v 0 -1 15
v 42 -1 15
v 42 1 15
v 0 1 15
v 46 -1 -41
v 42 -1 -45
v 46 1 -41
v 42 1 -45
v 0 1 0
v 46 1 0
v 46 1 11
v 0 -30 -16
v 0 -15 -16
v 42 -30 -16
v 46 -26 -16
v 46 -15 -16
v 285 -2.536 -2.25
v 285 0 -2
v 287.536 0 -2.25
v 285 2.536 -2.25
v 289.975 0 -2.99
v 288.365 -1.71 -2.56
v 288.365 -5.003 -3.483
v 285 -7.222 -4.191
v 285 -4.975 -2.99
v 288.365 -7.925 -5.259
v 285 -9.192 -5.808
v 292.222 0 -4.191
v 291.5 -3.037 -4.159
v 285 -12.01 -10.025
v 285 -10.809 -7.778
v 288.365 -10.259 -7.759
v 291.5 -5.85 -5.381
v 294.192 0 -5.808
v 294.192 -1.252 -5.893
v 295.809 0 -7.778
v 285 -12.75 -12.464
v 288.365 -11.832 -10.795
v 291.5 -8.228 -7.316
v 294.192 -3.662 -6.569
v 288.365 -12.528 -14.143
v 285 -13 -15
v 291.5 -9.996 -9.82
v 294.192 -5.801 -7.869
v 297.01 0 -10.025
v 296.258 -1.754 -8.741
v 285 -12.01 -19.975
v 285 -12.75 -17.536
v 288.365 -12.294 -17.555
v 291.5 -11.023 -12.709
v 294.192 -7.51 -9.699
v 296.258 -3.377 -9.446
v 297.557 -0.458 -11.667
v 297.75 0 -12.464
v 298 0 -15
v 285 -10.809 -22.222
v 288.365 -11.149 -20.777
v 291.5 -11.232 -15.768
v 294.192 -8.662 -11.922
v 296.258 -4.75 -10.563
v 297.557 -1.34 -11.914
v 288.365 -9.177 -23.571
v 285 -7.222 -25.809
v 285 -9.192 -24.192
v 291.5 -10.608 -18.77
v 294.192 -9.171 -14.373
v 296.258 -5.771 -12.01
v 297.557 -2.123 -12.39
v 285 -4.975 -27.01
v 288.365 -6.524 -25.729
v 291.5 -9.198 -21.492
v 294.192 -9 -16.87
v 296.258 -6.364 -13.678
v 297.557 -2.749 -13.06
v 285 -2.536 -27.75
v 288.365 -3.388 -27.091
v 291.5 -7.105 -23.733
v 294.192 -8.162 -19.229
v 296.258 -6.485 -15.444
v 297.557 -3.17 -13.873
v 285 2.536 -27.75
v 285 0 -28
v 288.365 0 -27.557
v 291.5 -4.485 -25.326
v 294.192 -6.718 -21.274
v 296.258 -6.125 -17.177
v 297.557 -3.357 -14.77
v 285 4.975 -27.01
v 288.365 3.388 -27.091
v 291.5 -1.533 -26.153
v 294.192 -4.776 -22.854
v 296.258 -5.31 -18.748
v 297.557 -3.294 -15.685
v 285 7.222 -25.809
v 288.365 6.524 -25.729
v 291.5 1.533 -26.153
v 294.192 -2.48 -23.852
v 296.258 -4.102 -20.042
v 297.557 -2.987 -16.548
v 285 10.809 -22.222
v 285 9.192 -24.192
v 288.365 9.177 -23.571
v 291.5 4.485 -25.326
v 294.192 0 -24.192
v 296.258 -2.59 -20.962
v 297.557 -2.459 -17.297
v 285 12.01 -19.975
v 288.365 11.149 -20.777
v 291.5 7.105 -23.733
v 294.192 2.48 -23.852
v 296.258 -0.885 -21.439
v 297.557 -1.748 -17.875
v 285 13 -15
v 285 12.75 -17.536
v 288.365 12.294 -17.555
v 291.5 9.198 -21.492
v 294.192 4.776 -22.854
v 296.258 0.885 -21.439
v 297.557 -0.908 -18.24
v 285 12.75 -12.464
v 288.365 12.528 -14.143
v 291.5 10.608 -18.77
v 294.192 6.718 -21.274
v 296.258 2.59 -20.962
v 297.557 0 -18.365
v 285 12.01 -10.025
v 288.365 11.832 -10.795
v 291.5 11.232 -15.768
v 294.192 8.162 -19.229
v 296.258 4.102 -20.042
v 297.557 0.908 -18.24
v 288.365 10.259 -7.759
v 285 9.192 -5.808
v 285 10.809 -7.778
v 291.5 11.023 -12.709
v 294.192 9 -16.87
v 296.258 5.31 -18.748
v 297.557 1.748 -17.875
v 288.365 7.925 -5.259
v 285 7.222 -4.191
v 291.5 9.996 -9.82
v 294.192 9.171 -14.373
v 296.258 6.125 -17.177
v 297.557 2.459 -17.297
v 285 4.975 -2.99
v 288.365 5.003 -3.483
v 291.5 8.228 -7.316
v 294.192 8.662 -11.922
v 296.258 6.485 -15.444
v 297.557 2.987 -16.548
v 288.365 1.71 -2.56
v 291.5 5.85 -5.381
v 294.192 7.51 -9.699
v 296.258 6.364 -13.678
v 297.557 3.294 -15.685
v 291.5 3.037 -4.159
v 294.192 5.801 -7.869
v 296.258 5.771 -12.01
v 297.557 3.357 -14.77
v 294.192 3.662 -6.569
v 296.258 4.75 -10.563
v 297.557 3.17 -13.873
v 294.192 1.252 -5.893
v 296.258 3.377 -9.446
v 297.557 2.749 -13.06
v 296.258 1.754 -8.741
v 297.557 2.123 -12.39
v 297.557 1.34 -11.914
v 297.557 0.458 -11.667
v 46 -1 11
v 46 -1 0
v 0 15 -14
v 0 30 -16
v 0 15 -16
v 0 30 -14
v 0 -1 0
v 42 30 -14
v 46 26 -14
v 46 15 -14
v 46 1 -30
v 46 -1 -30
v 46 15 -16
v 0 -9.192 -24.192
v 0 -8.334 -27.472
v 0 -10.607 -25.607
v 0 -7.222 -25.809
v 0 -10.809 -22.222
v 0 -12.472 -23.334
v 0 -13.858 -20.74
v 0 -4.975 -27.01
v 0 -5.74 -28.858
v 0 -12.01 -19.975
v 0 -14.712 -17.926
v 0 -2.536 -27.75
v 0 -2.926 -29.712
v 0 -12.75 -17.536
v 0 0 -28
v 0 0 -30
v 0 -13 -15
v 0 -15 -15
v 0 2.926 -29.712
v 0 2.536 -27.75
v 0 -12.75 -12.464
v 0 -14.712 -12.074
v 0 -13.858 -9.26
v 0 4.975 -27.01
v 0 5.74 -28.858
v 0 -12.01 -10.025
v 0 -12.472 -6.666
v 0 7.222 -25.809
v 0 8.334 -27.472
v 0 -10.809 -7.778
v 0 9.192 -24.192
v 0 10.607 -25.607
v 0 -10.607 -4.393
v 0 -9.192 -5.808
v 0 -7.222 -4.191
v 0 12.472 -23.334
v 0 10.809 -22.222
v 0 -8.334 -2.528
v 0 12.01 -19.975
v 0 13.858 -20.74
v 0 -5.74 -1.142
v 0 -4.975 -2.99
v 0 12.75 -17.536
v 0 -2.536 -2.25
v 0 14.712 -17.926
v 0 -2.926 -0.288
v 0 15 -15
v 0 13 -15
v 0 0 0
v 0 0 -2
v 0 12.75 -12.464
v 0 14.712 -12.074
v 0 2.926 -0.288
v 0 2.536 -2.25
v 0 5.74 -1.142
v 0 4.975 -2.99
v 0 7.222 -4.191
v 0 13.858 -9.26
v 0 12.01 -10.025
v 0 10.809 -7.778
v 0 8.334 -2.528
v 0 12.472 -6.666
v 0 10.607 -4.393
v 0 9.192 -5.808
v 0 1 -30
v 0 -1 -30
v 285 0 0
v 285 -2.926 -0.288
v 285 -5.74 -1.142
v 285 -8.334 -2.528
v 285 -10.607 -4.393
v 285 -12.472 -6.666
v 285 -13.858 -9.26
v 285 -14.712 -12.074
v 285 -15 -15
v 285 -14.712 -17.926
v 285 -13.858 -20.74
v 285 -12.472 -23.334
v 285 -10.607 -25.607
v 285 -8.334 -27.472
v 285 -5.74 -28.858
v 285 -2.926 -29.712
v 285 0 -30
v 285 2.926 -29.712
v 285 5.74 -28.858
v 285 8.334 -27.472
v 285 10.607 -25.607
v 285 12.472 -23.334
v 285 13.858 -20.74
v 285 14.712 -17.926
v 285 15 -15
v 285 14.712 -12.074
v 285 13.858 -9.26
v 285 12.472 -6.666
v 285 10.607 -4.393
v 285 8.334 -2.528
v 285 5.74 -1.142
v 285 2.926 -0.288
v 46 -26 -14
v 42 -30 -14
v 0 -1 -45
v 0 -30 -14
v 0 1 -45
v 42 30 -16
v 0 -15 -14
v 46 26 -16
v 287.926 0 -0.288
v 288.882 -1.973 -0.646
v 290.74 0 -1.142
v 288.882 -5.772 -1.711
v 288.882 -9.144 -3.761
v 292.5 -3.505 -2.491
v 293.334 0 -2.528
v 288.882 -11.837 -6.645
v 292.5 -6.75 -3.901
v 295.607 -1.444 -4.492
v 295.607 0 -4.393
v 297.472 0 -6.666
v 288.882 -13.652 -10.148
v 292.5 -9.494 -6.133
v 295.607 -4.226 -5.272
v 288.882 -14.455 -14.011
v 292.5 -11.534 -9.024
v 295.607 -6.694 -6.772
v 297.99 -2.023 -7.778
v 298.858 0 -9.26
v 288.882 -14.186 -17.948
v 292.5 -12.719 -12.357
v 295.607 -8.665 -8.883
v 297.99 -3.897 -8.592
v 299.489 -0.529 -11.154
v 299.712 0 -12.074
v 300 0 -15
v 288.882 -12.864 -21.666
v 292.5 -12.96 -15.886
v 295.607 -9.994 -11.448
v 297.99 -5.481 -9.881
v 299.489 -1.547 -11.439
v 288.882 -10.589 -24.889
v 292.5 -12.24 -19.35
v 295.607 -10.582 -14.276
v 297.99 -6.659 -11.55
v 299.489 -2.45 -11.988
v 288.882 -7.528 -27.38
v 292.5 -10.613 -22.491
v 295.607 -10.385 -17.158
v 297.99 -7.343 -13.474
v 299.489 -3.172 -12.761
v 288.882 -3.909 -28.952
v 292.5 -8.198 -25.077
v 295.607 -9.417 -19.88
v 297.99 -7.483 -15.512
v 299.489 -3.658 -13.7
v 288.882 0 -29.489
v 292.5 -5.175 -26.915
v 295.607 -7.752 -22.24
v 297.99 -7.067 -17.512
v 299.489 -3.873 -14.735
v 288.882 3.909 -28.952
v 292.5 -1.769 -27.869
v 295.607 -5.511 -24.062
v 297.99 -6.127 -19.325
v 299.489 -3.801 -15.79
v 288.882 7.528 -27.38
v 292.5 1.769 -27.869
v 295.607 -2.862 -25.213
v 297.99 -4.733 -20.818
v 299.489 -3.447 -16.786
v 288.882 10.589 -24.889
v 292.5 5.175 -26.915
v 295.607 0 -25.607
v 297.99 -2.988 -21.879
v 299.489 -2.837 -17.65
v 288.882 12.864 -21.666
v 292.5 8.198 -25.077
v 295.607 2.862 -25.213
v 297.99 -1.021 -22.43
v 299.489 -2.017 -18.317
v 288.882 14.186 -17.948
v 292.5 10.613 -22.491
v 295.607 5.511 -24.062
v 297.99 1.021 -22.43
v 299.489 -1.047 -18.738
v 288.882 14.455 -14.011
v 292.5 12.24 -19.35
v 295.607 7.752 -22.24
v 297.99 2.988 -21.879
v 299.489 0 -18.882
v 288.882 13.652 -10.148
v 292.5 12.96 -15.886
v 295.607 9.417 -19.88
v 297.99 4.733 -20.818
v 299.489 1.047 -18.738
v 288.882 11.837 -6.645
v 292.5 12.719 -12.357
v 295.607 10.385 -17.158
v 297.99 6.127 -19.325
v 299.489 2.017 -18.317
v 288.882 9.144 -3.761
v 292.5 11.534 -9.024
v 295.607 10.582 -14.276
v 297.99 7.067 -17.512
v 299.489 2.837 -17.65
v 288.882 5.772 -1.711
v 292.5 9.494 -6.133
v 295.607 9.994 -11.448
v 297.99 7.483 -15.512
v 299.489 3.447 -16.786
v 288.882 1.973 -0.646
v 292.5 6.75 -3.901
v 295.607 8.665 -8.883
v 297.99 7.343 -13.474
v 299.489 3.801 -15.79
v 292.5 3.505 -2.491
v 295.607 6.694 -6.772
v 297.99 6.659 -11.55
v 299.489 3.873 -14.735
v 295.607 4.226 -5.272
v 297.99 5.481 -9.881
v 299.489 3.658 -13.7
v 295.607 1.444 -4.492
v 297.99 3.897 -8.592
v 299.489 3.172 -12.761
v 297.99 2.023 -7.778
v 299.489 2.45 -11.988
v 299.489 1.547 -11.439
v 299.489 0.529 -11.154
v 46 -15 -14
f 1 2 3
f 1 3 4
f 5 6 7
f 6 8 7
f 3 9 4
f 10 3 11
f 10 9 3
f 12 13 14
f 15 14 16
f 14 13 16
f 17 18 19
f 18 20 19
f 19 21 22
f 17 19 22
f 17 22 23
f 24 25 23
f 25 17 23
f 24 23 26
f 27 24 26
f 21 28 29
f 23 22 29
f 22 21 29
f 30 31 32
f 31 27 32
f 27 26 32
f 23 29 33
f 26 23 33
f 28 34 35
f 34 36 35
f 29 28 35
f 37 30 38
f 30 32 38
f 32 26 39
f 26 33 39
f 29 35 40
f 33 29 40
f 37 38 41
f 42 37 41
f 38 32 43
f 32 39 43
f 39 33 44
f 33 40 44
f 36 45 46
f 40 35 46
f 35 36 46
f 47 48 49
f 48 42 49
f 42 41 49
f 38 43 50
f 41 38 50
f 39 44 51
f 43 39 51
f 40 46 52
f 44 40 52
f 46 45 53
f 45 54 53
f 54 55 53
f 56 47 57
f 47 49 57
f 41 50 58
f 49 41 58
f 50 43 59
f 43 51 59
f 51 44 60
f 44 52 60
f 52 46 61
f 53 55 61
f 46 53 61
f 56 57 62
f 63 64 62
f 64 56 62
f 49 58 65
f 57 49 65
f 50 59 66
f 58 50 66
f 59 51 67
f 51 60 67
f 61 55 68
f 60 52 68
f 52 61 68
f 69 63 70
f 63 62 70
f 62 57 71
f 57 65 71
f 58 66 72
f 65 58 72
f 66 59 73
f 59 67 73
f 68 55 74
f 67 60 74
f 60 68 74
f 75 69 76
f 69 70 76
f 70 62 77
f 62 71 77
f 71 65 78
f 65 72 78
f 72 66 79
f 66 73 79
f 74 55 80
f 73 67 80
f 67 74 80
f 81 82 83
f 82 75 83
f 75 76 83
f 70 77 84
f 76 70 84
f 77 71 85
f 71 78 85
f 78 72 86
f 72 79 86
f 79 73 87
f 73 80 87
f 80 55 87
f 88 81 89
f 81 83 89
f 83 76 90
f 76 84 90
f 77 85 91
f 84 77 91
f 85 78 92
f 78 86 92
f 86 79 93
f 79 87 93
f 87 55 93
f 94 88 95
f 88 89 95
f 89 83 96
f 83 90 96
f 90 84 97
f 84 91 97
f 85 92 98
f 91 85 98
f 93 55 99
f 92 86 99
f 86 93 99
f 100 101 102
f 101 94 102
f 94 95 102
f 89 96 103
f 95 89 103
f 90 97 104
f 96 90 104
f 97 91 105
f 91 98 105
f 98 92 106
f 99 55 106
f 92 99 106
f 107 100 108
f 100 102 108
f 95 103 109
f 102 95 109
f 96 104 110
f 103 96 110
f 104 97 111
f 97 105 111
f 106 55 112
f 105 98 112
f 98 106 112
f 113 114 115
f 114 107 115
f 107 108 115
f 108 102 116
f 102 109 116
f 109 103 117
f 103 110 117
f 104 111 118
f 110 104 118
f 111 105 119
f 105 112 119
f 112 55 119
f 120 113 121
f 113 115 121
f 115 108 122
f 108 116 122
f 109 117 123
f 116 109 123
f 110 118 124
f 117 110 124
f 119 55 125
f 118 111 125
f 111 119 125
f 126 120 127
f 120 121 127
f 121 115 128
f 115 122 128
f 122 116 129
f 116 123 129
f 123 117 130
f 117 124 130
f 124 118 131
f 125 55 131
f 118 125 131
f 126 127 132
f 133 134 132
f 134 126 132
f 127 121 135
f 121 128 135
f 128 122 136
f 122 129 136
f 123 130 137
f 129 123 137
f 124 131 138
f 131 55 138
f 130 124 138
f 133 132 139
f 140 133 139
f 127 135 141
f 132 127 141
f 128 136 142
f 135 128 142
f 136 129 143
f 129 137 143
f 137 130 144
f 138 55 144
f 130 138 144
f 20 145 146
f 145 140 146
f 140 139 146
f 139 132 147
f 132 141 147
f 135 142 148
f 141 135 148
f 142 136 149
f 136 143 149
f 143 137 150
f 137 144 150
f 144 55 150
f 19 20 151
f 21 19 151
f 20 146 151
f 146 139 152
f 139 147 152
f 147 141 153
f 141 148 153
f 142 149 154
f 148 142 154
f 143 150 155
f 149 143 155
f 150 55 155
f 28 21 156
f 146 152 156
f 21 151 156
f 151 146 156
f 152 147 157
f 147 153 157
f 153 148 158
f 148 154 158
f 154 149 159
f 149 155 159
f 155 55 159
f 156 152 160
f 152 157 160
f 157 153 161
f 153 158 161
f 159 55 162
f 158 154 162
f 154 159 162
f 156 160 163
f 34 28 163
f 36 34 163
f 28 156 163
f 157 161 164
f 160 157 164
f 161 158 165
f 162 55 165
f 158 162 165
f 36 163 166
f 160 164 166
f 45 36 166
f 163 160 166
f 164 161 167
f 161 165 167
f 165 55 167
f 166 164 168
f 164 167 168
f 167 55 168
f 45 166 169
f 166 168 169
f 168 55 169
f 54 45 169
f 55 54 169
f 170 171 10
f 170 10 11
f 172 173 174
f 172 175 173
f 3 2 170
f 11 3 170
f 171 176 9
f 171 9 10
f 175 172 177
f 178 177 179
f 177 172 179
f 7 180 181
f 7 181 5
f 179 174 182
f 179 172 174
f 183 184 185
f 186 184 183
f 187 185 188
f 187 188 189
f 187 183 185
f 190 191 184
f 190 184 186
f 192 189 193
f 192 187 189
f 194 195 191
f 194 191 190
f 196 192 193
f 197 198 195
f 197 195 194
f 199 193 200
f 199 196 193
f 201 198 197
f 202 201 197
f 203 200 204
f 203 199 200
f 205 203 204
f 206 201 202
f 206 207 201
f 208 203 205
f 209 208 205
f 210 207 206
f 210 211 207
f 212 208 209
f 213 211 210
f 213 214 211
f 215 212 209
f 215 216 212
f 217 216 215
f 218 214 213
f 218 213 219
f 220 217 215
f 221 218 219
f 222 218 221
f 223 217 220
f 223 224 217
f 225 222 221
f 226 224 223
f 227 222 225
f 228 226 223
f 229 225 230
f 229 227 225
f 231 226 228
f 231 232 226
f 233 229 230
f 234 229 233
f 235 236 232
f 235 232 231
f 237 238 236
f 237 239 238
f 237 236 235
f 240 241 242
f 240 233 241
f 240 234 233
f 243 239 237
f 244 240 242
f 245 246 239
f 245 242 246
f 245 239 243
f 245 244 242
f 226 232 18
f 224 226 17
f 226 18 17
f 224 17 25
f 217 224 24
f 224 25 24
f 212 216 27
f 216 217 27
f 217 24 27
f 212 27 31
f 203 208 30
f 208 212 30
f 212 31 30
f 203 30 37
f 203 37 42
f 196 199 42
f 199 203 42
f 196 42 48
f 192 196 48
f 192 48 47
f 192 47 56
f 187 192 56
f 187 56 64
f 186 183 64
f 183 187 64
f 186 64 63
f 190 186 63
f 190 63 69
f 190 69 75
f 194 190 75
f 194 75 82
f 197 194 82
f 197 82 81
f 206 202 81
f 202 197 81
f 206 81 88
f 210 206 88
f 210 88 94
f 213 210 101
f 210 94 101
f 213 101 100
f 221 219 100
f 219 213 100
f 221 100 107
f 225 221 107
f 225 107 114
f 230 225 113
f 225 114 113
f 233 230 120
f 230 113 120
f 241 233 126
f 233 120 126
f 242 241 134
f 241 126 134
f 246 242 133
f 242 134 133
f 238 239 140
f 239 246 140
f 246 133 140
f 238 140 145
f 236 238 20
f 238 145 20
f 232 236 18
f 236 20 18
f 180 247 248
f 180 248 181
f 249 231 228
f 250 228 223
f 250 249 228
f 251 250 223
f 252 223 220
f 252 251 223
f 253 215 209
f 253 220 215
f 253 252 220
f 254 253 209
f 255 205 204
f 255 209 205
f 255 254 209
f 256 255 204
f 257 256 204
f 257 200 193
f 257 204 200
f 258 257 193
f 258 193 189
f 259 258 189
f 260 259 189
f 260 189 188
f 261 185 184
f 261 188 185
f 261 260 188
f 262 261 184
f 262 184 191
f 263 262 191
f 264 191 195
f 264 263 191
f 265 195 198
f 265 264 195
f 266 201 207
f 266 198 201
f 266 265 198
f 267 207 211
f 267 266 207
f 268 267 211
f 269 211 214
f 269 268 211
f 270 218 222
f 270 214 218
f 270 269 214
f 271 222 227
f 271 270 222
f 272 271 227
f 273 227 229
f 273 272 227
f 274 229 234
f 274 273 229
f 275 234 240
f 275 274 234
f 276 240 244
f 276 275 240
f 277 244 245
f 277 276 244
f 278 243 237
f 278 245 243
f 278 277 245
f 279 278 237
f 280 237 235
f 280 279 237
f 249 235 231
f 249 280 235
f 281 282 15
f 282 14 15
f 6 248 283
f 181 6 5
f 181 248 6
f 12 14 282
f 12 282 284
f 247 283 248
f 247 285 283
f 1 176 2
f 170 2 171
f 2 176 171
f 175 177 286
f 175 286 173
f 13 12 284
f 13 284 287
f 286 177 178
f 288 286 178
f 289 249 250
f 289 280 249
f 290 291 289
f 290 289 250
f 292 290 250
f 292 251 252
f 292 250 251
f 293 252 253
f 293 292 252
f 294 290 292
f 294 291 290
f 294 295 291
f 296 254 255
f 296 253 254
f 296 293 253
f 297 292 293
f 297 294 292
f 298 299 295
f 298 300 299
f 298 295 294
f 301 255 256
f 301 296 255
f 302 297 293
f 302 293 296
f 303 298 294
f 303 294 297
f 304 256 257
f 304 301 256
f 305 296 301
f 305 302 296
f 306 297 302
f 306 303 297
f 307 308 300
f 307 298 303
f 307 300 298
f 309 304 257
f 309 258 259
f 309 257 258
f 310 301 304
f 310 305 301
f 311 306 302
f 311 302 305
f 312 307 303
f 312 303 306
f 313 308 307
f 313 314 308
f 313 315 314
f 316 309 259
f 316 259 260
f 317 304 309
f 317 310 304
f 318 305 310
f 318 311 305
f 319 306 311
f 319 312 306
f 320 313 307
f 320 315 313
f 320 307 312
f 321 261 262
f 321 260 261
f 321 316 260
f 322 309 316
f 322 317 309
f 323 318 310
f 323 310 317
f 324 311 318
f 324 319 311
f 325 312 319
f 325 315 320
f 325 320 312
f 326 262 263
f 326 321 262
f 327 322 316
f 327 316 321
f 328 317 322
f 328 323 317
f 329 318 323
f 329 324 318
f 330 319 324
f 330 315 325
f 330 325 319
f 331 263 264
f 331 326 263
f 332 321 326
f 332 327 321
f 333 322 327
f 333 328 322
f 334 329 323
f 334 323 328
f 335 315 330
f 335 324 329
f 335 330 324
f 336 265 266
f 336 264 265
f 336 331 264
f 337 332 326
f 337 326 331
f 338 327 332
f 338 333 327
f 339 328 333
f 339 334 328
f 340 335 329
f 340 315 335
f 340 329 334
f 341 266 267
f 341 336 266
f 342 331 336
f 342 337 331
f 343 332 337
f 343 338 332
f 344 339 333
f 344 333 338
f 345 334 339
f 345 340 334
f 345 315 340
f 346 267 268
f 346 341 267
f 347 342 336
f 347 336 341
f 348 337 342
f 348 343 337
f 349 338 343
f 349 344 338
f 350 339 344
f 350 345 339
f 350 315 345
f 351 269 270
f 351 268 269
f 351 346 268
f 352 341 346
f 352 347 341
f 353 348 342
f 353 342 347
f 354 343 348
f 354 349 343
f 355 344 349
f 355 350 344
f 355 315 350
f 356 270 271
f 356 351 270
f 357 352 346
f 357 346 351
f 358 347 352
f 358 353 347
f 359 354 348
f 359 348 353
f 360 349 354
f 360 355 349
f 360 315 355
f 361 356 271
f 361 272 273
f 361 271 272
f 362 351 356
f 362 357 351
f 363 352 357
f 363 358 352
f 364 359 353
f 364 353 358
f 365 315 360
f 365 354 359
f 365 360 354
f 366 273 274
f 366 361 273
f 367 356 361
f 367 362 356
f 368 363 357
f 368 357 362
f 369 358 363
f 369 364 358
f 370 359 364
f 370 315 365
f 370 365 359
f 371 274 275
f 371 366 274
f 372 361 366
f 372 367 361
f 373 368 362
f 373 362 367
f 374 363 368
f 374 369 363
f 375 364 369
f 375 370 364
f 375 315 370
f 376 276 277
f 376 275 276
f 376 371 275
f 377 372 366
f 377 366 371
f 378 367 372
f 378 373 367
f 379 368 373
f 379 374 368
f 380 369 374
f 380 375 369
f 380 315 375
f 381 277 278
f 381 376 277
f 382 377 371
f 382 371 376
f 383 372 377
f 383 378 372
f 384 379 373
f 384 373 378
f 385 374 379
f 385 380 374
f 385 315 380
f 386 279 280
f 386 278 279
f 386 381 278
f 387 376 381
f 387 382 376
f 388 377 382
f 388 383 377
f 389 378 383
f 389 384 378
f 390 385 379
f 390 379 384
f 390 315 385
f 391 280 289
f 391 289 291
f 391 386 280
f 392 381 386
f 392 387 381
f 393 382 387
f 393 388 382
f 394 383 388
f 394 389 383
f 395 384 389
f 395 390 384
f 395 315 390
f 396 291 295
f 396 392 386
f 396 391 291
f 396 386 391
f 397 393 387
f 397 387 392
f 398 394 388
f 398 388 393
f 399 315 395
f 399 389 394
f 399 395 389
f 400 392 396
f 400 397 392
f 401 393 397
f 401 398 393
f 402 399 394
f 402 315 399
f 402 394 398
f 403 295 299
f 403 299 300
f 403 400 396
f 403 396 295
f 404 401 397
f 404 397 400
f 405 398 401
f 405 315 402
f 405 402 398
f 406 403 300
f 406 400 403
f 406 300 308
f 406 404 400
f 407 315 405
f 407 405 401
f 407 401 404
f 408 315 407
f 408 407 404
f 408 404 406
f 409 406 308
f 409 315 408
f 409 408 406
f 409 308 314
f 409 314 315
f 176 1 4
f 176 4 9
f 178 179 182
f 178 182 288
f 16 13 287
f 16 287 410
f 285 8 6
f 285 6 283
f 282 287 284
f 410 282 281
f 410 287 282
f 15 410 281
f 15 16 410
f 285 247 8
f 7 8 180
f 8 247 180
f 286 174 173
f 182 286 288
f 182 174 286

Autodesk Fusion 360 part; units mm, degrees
sketch "Sketch1" plane through (0, 0, 0) normal (0, 1, 0) x (1, 0, 0)
  line L0 (0, 0) -> (285, 0)
  arc A0 (285, 0) -> (300, 15) centre (285, 15) ccw
  line L1 (0, 2) -> (285, 2)
  arc A1 (285, 2) -> (298, 15) centre (285, 15) ccw
  line L2 (0, 2) -> (0, 0)
  line L3 (300, 15) -> (298, 15)
  dimension "d1" = 285
revolve "Revolve1" add sketch "Sketch1" angle 360 about axis through (300, 0, -15) along (-1, 0, 0) makes body 1
sketch "Sketch2" plane through (0, 0, 0) normal (0, 1, 0) x (1, 0, 0)
  line L0 (0, 0) -> (46, 0)
  line L1 (46, 0) -> (46, -11)
  line L2 (42, -15) -> (0, -15)
  line L3 (0, -15) -> (0, 0)
  line L4 (42, -15) -> (46, -11)
  dimension "d6" = 46
  dimension "d7" = 15
  dimension "d8" = 45
  dimension "d9" = 4
extrude "Extrude1" add sketch "Sketch2" along normal mid plane 2 separate body makes body 2
pattern_circular "C-Pattern1" count 4 over 360 about axis through (300, 0, -15) along (-1, 0, 0) of bodies 2 makes body 3 at (29.3333, 20, -16) makes body 4 at (29.3333, -1, -35) makes body 5 at (29.3333, -20, -14)
